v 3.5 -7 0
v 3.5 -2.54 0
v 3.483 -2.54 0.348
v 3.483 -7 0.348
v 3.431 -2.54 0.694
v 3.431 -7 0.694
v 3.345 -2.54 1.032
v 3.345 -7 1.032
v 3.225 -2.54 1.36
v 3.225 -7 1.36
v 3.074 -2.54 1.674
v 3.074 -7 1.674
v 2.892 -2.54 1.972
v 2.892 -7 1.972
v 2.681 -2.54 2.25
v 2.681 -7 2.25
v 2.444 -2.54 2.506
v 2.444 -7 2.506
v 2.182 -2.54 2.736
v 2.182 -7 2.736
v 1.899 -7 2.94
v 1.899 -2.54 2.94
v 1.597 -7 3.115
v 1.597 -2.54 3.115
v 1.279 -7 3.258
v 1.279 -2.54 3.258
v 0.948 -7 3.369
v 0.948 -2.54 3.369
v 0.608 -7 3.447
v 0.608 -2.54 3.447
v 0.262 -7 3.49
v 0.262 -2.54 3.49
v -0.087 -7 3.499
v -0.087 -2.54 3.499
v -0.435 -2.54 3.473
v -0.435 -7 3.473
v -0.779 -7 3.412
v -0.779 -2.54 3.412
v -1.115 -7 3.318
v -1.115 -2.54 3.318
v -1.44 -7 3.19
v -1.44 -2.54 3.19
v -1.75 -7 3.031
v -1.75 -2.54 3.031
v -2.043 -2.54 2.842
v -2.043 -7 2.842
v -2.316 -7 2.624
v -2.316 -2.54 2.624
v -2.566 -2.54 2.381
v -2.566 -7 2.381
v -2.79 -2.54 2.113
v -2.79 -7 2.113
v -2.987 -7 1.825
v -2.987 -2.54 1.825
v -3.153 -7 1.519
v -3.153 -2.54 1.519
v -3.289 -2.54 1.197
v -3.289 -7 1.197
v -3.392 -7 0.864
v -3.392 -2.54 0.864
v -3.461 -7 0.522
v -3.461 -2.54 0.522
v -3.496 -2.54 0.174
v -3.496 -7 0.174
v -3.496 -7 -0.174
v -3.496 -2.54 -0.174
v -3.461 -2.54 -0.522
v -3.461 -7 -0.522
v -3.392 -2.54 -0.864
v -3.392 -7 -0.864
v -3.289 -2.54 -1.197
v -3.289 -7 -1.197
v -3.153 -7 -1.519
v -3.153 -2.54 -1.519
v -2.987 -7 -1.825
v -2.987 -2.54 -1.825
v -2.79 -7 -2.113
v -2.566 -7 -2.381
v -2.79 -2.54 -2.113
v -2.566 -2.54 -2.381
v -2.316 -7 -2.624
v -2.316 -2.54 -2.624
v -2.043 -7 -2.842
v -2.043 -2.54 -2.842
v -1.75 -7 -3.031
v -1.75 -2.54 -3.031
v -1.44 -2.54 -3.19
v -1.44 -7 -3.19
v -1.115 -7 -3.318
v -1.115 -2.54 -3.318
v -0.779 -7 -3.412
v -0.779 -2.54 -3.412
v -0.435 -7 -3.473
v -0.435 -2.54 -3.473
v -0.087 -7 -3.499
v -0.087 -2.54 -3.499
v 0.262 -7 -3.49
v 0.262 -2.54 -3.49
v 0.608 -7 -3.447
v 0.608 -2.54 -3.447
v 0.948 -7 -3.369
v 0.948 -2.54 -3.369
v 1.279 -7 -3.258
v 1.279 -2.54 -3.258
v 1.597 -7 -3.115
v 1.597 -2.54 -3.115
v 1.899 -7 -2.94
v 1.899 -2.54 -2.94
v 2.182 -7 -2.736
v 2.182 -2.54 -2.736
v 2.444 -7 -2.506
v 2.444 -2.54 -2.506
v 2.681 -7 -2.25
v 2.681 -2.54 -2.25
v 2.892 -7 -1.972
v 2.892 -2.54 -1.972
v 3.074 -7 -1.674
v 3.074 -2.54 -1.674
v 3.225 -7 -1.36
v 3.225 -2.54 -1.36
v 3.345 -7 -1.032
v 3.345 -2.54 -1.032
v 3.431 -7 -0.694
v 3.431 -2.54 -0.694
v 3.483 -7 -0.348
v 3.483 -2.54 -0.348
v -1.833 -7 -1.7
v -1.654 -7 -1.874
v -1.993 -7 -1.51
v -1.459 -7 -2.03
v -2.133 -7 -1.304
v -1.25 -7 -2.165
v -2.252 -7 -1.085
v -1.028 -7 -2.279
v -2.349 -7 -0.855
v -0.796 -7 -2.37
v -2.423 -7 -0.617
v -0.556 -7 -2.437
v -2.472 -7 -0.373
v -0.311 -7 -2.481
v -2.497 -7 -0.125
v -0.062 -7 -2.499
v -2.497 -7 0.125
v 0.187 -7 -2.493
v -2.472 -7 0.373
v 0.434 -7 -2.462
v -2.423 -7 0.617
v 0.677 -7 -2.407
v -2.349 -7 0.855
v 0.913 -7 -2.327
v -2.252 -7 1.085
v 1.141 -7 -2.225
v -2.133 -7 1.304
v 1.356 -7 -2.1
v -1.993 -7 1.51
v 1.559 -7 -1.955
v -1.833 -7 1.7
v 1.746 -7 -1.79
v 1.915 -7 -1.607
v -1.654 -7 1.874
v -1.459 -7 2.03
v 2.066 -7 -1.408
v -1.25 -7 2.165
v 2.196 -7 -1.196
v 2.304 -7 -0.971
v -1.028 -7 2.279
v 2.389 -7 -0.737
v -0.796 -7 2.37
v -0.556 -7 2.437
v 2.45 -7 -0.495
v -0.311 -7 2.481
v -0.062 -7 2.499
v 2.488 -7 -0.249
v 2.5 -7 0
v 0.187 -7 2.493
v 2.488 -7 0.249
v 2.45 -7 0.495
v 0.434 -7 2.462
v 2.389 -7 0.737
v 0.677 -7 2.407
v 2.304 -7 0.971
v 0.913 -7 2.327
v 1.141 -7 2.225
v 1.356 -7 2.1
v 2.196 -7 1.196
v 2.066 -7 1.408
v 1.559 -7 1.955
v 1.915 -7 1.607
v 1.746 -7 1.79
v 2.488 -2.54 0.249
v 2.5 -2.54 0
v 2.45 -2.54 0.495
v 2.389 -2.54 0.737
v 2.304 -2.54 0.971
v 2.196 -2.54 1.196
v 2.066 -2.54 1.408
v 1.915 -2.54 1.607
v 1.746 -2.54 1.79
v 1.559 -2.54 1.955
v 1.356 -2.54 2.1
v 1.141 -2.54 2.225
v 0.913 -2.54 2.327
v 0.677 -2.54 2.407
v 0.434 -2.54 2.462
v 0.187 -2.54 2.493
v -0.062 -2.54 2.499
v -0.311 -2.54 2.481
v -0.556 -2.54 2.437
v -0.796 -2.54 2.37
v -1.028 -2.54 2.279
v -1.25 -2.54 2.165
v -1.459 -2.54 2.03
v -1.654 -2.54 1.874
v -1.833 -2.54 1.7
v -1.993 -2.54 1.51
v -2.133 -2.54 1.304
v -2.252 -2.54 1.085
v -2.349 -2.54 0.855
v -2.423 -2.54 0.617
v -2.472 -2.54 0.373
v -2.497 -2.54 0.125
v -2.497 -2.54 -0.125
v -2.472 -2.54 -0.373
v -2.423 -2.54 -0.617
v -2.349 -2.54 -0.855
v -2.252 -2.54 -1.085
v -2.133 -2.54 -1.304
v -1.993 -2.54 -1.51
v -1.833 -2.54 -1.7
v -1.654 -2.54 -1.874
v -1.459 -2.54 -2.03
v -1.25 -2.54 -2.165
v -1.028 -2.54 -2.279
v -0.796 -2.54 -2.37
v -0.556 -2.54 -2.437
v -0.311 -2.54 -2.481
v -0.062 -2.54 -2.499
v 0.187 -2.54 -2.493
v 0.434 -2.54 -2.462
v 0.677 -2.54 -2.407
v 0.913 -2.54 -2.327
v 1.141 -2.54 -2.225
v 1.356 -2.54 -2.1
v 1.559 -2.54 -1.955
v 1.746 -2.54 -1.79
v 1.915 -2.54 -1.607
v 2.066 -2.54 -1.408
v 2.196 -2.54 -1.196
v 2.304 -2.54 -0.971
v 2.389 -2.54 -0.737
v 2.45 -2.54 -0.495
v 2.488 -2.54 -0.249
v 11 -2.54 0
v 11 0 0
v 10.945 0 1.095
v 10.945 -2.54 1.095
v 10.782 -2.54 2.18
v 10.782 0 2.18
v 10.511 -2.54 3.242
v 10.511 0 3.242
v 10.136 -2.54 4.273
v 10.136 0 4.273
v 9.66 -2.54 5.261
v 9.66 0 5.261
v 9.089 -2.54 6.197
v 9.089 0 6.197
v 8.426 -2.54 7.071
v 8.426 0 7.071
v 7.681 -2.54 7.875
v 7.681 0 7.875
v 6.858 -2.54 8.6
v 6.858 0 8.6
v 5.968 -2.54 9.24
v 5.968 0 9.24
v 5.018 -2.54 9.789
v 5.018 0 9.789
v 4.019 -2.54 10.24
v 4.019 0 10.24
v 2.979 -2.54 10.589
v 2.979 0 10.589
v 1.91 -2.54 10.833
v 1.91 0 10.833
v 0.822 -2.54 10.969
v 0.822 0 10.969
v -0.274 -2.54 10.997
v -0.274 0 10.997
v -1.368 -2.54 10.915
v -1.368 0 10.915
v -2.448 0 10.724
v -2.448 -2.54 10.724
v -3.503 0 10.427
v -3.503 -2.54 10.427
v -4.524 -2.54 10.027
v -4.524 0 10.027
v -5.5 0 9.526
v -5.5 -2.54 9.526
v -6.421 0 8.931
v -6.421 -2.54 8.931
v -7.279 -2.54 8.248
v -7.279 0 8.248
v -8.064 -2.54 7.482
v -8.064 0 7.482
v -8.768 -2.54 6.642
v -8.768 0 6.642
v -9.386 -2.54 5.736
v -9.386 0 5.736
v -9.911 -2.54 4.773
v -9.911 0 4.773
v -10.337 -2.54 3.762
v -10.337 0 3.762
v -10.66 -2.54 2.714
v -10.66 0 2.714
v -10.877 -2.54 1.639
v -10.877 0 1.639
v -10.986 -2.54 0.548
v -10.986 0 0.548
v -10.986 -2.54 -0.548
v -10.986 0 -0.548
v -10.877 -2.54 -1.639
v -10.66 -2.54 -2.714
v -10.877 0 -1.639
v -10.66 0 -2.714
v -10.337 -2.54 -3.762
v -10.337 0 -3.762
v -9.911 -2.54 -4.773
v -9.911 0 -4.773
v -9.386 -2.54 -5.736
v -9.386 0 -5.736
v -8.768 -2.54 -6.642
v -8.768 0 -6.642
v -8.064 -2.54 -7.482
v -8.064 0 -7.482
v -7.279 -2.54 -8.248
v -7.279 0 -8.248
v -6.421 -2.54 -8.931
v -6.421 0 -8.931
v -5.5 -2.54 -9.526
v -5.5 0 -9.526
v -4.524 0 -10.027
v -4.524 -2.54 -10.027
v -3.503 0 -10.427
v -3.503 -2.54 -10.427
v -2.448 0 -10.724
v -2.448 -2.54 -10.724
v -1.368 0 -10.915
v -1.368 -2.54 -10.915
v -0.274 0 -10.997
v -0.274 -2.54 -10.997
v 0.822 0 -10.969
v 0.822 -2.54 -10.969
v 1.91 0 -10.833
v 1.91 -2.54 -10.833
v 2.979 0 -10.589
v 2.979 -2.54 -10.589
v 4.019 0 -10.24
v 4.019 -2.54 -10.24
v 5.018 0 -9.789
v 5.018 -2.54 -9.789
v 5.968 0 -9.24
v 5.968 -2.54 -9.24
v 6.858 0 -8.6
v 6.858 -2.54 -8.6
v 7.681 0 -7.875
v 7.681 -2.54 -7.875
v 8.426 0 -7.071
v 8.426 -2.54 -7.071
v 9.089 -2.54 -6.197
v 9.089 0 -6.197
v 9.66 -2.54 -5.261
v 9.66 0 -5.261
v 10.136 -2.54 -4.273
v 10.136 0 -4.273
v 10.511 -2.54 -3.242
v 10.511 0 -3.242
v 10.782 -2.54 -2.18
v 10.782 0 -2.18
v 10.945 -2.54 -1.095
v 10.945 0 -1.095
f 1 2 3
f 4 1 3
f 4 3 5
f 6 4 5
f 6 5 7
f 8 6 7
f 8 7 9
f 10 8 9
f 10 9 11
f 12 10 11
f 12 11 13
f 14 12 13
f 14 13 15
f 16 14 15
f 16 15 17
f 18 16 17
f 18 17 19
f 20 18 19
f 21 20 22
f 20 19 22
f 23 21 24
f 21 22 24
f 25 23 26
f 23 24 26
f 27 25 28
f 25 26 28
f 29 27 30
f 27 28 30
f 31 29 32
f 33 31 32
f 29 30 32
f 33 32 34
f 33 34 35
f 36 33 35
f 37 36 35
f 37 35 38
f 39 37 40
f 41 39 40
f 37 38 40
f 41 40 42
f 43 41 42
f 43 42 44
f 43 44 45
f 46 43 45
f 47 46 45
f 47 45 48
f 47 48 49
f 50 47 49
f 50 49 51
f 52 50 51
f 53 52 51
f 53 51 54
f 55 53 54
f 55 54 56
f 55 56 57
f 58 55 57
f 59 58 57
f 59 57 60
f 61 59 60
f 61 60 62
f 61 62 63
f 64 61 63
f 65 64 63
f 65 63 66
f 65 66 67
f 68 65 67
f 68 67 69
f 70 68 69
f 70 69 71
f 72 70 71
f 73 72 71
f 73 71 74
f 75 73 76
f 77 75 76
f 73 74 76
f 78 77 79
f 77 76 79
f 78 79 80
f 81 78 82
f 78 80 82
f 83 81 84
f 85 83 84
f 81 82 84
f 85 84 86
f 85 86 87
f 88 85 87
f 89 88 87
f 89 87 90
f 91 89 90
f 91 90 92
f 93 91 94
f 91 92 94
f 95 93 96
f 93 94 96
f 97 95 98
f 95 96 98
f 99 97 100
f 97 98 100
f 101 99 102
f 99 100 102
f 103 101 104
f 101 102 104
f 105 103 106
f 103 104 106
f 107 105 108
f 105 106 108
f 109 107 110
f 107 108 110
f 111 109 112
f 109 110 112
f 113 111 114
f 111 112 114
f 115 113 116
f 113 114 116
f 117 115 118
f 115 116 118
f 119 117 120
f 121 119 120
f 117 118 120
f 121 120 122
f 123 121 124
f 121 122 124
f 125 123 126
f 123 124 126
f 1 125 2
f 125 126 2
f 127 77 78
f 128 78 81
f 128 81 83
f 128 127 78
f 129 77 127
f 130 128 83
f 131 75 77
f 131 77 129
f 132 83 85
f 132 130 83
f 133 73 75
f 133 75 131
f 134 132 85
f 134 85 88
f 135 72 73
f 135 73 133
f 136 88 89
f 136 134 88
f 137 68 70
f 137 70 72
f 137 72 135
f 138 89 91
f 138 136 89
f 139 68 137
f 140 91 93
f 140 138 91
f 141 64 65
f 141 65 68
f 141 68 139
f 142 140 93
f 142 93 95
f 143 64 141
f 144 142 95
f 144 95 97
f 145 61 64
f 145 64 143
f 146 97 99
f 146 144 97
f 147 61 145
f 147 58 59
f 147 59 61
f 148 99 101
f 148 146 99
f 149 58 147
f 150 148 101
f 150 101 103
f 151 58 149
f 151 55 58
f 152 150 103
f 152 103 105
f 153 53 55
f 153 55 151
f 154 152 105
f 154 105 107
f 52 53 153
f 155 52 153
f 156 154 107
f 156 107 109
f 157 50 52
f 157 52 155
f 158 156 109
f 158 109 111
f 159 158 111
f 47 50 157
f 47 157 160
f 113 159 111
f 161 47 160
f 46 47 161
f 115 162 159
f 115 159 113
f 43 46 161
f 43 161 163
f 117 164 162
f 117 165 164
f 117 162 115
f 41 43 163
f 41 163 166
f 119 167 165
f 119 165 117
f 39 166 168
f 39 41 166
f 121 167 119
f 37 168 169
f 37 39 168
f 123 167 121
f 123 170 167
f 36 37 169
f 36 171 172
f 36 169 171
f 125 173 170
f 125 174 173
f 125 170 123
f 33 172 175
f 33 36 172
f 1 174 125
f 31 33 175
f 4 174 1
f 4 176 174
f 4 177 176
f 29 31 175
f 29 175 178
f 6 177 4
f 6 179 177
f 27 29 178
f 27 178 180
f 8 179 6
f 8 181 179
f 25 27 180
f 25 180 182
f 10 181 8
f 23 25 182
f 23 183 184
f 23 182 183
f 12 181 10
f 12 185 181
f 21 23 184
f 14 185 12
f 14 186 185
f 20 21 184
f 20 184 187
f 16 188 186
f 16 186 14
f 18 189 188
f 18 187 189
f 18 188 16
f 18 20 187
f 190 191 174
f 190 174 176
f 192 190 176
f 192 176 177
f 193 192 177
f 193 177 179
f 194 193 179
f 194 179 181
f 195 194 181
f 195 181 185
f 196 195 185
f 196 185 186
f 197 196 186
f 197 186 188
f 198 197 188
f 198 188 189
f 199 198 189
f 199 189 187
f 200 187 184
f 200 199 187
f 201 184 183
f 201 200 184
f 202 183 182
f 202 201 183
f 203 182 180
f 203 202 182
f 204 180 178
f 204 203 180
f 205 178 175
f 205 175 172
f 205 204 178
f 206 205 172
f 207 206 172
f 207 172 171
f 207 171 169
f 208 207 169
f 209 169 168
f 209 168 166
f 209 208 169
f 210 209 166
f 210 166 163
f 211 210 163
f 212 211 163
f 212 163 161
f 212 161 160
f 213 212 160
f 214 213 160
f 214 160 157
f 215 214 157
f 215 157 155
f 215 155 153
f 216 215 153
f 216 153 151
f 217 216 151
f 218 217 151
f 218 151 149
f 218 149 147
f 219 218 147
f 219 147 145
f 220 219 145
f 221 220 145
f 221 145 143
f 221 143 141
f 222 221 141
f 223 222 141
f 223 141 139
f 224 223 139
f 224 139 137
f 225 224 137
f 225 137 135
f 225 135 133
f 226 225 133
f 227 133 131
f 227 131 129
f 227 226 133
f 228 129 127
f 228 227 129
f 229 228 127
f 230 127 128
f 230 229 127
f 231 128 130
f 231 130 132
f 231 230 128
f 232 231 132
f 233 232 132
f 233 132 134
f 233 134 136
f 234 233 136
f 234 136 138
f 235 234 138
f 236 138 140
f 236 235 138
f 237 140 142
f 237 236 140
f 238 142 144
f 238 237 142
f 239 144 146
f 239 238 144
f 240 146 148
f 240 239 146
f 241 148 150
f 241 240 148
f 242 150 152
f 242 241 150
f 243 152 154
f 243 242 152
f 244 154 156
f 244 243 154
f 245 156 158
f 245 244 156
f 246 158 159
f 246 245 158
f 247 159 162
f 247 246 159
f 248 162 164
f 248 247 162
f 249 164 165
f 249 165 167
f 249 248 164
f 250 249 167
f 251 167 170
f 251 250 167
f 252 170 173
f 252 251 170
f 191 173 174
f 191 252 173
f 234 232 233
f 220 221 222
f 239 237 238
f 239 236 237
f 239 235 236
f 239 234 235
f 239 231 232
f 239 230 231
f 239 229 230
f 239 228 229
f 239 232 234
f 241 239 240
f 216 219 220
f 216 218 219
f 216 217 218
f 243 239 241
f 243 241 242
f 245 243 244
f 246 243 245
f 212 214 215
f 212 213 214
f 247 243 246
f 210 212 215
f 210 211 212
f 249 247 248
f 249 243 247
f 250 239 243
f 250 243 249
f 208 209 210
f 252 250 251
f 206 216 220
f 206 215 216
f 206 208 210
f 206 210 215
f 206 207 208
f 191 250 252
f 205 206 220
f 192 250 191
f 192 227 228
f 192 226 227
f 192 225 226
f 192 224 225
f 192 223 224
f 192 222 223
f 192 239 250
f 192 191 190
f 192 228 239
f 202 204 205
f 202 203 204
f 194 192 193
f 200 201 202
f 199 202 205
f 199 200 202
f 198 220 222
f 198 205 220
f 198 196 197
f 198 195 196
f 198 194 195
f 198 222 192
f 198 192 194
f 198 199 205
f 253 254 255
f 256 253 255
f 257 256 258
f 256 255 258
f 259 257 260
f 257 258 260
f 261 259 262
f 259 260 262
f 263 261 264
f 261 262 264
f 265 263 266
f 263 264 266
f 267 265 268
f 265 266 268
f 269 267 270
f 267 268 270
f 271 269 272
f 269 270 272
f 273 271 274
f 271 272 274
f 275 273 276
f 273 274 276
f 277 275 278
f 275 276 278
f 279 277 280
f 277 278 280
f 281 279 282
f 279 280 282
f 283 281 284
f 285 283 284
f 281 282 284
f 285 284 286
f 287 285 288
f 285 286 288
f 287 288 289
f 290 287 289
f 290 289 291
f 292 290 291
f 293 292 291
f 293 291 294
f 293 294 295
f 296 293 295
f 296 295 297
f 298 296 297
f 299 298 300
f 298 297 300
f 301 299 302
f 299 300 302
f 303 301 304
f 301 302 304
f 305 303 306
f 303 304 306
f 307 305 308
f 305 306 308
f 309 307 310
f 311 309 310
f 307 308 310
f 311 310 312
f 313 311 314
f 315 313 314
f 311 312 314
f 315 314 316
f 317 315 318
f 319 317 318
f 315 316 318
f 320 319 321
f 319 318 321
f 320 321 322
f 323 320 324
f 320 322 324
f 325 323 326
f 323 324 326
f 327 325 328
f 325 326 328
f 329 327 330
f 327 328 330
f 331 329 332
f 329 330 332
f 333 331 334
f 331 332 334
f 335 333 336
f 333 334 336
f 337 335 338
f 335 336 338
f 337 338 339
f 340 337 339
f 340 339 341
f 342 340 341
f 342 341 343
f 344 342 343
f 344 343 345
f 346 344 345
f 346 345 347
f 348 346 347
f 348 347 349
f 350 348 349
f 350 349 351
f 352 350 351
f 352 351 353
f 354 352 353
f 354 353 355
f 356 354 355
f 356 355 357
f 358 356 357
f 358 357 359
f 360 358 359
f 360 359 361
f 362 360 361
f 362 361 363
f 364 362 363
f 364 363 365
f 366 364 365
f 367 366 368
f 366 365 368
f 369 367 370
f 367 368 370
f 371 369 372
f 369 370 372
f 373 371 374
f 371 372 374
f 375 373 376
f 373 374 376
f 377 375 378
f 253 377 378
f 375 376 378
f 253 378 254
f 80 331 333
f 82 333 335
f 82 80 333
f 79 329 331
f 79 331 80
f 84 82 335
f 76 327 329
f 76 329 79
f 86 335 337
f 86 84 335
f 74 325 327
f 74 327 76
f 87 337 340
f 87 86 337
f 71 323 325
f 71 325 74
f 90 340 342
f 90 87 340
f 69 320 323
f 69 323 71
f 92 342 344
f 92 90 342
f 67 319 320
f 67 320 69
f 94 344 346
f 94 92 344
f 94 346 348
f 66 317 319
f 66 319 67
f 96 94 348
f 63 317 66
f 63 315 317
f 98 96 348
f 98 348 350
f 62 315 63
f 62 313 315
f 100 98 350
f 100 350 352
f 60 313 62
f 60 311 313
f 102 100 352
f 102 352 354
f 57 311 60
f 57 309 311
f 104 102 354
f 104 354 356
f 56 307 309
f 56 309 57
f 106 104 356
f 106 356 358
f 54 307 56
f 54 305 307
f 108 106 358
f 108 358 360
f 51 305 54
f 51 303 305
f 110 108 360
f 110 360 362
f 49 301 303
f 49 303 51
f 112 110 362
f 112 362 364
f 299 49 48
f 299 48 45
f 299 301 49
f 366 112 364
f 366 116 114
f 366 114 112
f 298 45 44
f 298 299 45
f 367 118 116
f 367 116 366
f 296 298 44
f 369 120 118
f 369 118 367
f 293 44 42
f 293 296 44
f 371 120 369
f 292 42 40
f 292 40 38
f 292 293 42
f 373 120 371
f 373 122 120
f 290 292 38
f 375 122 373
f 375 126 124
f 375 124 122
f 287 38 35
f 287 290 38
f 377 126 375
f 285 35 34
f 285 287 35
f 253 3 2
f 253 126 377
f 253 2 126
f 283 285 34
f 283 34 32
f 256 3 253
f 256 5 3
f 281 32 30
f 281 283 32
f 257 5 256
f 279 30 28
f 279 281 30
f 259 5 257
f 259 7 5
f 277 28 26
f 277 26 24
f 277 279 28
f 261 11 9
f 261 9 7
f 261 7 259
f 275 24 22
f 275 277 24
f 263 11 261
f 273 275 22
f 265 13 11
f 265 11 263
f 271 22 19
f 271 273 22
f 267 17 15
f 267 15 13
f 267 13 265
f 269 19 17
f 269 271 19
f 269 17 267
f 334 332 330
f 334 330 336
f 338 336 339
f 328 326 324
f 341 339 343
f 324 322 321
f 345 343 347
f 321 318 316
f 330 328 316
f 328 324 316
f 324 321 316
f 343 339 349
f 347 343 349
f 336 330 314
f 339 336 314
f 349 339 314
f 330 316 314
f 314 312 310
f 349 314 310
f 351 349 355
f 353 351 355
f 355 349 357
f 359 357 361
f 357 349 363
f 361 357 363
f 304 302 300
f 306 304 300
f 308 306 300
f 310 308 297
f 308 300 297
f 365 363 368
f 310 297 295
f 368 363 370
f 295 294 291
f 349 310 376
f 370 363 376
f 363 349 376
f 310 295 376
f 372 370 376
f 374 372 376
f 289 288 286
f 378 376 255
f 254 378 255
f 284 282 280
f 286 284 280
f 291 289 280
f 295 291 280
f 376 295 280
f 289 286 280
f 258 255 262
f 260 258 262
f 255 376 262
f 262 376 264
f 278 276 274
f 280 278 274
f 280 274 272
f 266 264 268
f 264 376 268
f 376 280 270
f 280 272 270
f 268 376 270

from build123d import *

# Parameters (mm, degrees)
F0_R     = 3.5
F0_R_2   = 2.5
F1_DEPTH = 7
F2_R     = 11
F3_DEPTH = 2.54


with BuildPart() as f1:
    # F0 (on Front) → F1 (new body)
    with BuildSketch(Plane.XZ):
        Circle(F0_R)
        Circle(F0_R_2, mode=Mode.SUBTRACT)
    extrude(amount=F1_DEPTH)

    # F2 (on Front) → F3 (join)
    with BuildSketch(Plane.XZ):
        Circle(F2_R)
    extrude(amount=F3_DEPTH)


solid = f1.part
